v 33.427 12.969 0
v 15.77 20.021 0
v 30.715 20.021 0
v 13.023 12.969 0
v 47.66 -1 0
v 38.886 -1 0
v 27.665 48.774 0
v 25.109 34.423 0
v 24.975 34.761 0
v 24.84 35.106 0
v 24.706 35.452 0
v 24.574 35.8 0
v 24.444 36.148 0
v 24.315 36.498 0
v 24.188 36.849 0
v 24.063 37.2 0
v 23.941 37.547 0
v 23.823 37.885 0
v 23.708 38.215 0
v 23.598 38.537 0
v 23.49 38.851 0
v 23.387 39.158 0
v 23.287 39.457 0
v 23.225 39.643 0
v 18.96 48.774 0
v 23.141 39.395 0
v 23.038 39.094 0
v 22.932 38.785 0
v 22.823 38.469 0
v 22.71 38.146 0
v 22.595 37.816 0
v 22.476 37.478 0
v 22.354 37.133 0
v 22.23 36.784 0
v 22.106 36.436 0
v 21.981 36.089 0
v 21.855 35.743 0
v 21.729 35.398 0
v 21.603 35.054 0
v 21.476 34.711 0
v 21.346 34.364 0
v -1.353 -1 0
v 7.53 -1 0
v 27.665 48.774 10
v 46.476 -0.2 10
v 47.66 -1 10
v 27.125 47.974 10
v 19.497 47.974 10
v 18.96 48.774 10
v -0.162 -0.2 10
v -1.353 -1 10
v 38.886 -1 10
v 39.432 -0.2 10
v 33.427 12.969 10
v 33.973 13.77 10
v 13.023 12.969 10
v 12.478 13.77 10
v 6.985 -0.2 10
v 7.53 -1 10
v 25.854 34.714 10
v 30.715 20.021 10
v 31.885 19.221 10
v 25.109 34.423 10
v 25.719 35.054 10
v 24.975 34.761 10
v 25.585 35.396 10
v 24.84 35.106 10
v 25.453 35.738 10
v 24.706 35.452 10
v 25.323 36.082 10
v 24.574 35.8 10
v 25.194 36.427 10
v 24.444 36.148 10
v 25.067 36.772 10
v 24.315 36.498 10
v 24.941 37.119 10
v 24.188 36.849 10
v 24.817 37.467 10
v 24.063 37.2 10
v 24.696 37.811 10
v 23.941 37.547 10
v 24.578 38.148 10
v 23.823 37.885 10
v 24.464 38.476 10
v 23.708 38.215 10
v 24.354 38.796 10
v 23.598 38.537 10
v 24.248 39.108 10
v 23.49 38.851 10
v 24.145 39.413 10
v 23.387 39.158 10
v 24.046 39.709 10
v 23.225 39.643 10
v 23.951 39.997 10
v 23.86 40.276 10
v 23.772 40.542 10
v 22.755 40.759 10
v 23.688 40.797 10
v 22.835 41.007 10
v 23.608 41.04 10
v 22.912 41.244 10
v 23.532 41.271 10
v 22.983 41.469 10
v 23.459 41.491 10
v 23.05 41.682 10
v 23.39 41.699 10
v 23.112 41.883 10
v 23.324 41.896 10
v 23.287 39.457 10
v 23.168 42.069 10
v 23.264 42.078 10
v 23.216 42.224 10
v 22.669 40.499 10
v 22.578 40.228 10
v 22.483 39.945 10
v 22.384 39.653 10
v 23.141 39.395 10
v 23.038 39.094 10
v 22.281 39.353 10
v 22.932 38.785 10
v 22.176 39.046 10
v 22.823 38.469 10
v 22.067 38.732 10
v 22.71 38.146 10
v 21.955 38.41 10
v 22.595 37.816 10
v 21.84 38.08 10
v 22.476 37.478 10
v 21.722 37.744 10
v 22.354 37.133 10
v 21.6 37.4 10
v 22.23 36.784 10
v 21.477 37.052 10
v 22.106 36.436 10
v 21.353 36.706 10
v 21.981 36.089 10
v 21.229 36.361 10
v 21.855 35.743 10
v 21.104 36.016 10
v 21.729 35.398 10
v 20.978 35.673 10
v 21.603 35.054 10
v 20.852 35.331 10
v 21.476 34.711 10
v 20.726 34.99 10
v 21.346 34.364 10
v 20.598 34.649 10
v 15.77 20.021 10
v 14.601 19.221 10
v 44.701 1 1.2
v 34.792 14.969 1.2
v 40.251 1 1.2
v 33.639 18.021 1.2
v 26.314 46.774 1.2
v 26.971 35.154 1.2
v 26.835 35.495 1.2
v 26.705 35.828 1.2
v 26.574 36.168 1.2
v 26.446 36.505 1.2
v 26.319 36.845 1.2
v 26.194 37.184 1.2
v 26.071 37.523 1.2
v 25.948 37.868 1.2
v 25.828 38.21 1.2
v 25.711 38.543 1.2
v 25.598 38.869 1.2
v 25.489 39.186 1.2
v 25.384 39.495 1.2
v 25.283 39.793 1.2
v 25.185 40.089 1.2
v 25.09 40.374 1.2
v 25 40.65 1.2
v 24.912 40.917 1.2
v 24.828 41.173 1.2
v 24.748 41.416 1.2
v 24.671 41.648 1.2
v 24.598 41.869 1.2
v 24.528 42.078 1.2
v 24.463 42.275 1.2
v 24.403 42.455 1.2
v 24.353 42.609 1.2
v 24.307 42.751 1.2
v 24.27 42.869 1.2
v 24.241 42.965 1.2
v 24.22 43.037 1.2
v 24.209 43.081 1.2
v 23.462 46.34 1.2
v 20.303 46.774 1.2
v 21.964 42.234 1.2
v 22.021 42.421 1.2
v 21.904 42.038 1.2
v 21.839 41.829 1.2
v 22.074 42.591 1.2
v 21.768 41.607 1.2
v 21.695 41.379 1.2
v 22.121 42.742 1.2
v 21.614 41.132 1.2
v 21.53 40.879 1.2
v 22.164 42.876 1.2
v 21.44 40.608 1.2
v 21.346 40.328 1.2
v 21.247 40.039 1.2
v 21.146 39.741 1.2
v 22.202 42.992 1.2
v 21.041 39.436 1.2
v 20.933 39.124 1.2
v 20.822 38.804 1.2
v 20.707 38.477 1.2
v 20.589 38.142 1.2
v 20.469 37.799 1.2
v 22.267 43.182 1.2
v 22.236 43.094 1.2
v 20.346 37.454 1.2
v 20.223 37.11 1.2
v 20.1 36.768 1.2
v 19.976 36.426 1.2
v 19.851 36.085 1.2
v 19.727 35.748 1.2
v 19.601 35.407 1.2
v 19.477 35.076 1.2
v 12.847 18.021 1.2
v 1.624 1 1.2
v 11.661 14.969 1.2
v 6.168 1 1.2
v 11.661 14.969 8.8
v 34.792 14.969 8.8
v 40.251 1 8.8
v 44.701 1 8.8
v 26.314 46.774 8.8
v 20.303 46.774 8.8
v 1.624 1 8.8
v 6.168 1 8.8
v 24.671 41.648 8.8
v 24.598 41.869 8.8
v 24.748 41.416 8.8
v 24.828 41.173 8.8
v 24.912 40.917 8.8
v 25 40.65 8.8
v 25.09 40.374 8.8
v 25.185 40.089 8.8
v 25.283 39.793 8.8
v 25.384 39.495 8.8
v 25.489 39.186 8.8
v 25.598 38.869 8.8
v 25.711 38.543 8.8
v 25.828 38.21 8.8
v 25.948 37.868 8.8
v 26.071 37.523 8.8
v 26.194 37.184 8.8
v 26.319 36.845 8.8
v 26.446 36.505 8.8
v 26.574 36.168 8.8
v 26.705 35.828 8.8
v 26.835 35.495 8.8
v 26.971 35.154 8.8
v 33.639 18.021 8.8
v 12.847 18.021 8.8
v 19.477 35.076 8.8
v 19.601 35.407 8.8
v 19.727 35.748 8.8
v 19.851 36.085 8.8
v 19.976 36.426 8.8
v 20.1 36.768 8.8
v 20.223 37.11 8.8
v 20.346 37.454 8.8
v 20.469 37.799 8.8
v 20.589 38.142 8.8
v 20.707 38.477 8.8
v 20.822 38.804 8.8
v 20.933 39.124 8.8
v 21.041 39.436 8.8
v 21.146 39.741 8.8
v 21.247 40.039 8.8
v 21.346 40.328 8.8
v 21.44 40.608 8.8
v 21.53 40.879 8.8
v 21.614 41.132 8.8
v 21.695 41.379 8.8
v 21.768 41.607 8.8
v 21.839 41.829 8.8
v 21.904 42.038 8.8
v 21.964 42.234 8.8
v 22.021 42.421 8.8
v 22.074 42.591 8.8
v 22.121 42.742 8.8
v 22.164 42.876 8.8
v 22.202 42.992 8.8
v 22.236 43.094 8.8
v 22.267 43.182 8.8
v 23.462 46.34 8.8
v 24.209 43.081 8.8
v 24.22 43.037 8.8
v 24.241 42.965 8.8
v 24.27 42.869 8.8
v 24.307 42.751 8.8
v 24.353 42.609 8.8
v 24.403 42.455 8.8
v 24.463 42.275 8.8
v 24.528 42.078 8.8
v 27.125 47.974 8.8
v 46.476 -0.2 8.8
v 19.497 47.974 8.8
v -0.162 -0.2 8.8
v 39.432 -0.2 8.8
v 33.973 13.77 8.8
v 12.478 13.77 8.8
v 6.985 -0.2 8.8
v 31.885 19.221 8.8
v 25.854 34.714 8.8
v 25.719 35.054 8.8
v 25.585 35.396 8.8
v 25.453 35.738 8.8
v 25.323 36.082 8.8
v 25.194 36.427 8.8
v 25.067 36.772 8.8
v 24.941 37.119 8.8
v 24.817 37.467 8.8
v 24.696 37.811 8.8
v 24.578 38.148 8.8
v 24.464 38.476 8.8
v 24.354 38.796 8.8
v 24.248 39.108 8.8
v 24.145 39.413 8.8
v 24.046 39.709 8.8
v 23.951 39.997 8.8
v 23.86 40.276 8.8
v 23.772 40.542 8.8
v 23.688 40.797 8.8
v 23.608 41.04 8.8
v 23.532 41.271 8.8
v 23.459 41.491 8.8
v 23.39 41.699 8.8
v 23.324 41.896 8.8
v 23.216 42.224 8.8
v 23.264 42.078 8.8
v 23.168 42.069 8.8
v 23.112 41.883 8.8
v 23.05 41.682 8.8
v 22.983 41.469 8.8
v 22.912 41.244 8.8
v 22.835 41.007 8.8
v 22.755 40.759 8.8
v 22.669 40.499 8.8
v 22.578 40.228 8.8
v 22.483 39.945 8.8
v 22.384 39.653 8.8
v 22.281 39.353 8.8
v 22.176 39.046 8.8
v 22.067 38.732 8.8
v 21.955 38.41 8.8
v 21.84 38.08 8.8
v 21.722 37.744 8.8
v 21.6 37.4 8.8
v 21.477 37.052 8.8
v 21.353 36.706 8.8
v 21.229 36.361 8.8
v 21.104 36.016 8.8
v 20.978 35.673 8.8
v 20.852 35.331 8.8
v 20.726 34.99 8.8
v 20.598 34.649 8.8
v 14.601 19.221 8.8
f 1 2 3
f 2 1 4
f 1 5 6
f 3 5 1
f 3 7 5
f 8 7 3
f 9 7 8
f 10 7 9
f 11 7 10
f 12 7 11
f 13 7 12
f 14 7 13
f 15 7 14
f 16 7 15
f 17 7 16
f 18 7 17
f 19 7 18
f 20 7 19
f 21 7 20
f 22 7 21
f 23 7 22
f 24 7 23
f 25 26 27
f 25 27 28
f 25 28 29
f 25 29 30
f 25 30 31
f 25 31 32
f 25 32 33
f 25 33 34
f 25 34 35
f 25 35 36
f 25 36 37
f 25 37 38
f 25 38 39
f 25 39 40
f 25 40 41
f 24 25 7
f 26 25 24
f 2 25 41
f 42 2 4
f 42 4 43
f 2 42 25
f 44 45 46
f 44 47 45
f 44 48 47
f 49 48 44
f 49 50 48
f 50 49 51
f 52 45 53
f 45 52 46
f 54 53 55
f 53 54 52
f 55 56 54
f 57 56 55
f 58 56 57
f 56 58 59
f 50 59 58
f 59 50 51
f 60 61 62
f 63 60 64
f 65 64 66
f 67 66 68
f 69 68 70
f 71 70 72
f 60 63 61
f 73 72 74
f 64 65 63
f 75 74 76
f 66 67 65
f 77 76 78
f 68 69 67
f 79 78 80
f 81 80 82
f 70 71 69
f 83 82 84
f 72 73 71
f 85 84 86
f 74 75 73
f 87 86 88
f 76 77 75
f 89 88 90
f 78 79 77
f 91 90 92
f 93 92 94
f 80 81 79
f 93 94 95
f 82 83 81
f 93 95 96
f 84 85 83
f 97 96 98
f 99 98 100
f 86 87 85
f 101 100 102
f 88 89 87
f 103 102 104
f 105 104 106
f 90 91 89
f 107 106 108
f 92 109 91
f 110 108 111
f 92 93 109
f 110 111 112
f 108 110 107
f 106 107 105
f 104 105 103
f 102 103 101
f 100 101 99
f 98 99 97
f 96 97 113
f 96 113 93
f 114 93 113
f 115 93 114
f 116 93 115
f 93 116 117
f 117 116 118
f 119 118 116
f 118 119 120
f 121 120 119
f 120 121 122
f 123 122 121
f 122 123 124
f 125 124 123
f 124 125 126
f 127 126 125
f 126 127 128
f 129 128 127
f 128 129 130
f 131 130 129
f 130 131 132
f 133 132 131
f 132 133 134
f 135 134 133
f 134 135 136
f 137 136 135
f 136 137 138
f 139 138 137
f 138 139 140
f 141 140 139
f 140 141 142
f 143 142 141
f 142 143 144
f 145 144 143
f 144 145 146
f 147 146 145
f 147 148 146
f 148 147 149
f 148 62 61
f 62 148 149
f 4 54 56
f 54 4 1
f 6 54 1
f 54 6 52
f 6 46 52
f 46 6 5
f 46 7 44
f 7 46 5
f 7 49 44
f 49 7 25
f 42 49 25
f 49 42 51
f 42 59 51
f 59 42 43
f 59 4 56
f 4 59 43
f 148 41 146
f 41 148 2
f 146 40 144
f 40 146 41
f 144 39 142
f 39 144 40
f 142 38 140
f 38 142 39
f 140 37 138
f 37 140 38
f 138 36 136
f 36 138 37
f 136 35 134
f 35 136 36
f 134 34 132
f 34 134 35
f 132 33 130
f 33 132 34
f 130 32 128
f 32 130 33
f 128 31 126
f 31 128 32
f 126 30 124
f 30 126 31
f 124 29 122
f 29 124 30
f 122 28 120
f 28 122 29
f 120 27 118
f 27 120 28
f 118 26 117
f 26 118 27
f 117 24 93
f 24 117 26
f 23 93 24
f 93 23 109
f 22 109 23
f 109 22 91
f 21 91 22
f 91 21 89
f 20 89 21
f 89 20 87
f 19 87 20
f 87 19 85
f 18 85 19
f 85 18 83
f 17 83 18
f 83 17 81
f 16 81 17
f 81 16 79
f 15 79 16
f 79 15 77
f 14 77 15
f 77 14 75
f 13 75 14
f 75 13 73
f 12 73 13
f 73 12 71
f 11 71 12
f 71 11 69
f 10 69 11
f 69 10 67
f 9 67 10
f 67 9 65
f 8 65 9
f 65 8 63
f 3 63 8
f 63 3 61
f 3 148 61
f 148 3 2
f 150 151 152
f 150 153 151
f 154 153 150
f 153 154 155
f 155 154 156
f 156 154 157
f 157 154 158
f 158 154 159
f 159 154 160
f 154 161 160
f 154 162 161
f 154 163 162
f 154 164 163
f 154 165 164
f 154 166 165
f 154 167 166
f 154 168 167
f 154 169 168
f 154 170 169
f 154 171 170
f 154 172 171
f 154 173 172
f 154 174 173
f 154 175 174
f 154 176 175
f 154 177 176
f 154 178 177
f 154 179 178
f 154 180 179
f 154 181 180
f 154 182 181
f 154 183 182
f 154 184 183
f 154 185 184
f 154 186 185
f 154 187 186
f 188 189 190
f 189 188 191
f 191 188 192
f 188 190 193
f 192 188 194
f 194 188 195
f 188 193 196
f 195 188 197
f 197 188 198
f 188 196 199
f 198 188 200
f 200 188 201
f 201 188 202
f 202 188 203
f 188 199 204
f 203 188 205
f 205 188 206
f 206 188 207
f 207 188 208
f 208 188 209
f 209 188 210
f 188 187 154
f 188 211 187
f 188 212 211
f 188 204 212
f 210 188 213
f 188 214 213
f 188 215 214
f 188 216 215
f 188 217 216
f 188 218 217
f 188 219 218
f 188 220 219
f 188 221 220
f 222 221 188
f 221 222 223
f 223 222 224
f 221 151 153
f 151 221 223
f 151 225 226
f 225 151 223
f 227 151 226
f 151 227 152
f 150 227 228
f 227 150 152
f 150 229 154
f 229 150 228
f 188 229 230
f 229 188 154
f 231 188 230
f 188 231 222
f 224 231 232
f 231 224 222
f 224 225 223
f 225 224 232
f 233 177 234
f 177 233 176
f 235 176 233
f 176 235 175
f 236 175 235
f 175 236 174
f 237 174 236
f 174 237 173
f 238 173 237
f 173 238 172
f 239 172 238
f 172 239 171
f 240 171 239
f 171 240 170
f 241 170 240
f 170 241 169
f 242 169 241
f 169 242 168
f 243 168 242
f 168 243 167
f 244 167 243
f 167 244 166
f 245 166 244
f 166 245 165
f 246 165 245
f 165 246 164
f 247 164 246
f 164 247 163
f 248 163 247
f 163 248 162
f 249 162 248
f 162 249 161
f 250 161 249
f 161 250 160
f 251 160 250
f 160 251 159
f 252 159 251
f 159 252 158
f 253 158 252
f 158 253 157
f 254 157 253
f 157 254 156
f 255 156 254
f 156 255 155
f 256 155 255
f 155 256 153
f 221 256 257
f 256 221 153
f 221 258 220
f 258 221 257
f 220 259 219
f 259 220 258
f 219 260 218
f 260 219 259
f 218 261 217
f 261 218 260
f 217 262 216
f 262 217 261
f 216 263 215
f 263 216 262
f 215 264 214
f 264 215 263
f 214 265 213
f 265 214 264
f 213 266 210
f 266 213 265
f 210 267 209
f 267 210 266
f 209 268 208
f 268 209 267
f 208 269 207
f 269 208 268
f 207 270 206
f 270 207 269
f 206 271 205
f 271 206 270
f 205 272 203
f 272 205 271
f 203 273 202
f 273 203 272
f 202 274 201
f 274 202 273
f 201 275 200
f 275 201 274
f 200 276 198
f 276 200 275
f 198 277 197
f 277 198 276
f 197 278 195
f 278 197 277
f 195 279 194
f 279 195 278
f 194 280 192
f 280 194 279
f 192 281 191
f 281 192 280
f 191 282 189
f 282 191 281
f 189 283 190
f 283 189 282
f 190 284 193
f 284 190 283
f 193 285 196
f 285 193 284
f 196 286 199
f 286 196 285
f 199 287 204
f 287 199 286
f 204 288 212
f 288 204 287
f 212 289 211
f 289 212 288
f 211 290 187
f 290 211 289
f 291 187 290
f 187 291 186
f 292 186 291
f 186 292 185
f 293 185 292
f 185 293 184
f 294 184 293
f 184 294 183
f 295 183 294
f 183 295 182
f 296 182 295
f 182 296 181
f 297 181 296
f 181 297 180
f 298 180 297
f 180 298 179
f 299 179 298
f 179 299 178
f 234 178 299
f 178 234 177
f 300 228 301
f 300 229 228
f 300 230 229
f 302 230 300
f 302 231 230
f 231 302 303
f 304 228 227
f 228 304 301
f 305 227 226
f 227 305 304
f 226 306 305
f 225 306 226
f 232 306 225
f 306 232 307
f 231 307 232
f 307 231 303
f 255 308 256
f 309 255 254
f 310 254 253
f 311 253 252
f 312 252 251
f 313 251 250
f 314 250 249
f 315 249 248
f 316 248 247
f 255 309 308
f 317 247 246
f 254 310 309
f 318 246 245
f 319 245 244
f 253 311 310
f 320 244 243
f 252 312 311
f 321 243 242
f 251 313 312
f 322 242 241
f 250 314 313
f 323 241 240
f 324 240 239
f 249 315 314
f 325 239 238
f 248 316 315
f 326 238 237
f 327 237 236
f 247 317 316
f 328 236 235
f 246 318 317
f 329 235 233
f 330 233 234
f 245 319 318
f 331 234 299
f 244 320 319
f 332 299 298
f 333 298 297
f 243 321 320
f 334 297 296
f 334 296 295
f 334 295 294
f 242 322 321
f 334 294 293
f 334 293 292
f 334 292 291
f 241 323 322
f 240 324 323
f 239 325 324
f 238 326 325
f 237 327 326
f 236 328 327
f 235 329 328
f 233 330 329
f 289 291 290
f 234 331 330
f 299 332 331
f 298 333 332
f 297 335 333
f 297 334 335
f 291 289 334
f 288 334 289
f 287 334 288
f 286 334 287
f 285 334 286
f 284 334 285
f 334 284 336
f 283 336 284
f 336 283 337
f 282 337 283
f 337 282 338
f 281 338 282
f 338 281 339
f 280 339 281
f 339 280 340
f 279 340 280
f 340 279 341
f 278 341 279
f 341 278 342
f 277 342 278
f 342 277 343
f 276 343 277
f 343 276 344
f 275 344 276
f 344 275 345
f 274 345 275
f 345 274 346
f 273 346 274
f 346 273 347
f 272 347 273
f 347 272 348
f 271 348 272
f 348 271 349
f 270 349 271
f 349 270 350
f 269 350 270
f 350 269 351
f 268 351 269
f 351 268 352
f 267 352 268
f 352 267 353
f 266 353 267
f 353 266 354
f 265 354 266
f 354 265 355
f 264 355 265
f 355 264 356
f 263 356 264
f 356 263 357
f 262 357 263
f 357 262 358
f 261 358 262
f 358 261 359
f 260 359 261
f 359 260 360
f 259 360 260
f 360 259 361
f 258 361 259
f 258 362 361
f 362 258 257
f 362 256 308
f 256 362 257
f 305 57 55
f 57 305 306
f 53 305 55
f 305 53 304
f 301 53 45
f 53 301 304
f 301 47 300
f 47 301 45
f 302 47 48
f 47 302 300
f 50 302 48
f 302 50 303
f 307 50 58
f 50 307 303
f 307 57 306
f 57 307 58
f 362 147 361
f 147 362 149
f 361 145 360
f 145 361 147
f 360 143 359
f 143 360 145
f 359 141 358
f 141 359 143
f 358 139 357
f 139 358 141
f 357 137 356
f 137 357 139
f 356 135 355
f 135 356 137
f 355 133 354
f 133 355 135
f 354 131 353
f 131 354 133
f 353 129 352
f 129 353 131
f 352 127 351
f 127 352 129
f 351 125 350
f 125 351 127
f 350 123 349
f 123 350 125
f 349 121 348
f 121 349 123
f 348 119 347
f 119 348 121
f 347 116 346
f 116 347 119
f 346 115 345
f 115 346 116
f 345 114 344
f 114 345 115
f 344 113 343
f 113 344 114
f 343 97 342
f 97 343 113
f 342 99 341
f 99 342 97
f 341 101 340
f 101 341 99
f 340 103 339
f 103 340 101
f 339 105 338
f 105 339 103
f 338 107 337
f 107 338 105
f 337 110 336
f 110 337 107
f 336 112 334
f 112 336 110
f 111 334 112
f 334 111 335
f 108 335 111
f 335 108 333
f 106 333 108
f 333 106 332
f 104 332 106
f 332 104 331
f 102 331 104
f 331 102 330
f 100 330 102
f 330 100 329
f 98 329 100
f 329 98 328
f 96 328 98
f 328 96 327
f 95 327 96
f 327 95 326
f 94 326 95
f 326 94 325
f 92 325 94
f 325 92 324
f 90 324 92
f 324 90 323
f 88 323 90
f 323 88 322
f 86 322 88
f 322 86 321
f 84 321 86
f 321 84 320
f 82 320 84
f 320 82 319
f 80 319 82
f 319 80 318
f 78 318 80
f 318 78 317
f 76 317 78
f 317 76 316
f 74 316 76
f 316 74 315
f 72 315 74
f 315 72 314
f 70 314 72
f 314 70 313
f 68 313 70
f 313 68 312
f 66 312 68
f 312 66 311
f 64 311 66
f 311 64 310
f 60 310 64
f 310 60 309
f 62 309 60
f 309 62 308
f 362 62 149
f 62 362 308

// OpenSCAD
// file: include/signmaker.scad
// OpenSCAD LED signmaker
// to be included in own OpenSCAD scripts
// inspired by BigClive's livestream from 2022-06-11.

module signbody(h=10, ww=2.4, fl=1.2, fh=1.2, pl=0.2) {
    pf=0.001;
    difference() {
        linear_extrude(height=h)
            offset(delta=ww/2)
                children();
        translate([0,0,fl])
            linear_extrude(height=h-fl+pf)
                offset(delta=-ww/2)
                    children();
        translate([0,0,h-fh])
            linear_extrude(height=h)
                offset(delta=pl)
                    children();
    }
}

module signface(fh=1.2) {
    linear_extrude(height=fh)
        children();
}
// main file
// OpenSCAD sign maker (sign body)
//
// Inspried by script in description of
// BigClive's livestream from 2022-06-11.
//
//
// Select the font name from the list of available fonts:
// Menu: "Help" > "Font List"
//

//Text to render
text="A";

//Font to use
font="Arial";

//Text size
size=50;

//Height of the sign body
h=10;

//Wall width
ww=2;

//Floor height (set to -1 for open base)
fl=1.2;

//Face height
fh=1.2;

//Play for fitting face
pl=0.2;

///////////////////////////
$fn=60;

include <include/signmaker.scad>;

signbody(h=h, ww=ww, fl=fl, fh=fh) {
    text(text, font=font, size=size);
}
